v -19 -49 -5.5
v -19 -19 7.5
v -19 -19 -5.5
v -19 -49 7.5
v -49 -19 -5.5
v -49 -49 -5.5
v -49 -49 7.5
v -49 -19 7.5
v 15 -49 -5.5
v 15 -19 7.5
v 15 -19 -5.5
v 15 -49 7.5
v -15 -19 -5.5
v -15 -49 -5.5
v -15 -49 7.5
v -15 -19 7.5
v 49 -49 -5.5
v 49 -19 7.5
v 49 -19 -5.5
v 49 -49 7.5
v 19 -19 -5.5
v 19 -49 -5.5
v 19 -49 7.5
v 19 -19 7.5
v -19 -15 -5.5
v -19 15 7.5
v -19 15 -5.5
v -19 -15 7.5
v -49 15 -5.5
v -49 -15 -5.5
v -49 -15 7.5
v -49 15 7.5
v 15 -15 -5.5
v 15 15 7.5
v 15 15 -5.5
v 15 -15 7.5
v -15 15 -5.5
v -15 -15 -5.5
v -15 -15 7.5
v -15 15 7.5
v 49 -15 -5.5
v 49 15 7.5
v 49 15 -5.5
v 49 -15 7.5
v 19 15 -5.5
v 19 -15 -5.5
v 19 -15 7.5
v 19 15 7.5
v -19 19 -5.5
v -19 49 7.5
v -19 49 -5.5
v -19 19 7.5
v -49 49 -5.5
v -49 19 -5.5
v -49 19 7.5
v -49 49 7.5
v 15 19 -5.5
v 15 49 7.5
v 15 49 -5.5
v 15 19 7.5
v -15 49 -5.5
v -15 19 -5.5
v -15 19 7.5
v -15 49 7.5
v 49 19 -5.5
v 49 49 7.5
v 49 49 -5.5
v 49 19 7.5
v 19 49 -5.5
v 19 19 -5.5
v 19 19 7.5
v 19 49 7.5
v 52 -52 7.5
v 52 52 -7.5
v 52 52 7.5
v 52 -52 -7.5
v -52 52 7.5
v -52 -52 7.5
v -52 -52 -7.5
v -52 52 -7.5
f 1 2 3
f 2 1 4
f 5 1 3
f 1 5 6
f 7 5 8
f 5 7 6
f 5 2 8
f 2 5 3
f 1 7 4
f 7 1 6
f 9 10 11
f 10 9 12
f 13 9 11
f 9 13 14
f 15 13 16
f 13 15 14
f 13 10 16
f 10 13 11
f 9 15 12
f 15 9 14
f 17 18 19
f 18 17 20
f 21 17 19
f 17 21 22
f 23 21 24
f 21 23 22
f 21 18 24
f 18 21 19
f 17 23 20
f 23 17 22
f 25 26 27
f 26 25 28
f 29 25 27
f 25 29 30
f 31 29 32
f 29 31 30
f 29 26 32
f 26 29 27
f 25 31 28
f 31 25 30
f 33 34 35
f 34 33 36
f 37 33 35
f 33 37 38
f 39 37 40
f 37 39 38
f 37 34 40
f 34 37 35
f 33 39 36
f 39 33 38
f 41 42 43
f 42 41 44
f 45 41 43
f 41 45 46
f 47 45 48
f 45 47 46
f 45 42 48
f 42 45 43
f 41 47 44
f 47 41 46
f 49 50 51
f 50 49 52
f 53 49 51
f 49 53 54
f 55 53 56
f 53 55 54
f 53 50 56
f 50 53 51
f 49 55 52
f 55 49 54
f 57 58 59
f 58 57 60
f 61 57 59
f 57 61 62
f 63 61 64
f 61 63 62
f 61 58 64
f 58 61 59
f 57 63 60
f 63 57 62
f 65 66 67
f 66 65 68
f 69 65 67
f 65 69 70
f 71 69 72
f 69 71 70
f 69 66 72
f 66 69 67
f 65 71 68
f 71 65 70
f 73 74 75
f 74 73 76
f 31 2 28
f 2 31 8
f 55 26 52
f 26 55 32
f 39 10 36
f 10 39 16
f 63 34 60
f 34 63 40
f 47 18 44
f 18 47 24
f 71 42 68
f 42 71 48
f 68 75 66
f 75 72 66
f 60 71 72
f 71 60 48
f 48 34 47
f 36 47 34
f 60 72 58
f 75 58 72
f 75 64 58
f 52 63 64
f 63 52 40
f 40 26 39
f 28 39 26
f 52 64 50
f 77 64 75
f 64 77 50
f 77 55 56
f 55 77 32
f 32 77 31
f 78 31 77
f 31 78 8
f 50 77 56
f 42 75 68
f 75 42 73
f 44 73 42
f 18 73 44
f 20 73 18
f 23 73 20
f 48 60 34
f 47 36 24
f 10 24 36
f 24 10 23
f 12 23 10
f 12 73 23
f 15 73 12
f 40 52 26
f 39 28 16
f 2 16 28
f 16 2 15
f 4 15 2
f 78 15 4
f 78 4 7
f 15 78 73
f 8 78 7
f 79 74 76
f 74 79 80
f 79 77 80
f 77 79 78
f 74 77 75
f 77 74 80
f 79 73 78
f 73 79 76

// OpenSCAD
$fn = 32;

// ----------------------------------------------------------------------
// Pocket plate 104 x 104 x 15
// 3 x 3 pockets 30 mm square, 13 mm deep
// ----------------------------------------------------------------------

// --- parameters (mm) ---
thickness = 15;  // plate thickness
floor_t = 2;     // material left under each pocket
pocket = 30;     // pocket side length
pitch_x = 34;    // pocket pitch along X
pitch_y = 34;    // pocket pitch along Y
cols = 3;        // pockets per row
rows = 3;        // rows of pockets

// --- derived feature positions (mm) ---
depth = thickness - floor_t;        // = 13   pocket depth, down to the floor
span_x = (cols - 1) * pitch_x;      // = 68   distance between outer pockets
span_y = (rows - 1) * pitch_y;      // = 68   distance between outer pocket rows
origin_x = -span_x / 2;             // = -34   X of the first pocket
origin_y = -span_y / 2;             // = -34   Y of the first pocket
plate = [span_x + pocket + 6, span_y + pocket + 6, thickness];  // = [104, 104, 15]   overall size: pockets plus 3 mm of wall on each side
feature_centers = [
  [origin_x + 0 * pitch_x, origin_y + 0 * pitch_y],
  [origin_x + 1 * pitch_x, origin_y + 0 * pitch_y],
  [origin_x + 2 * pitch_x, origin_y + 0 * pitch_y],
  [origin_x + 0 * pitch_x, origin_y + 1 * pitch_y],
  [origin_x + 1 * pitch_x, origin_y + 1 * pitch_y],
  [origin_x + 2 * pitch_x, origin_y + 1 * pitch_y],
  [origin_x + 0 * pitch_x, origin_y + 2 * pitch_y],
  [origin_x + 1 * pitch_x, origin_y + 2 * pitch_y],
  [origin_x + 2 * pitch_x, origin_y + 2 * pitch_y]
];   // pocket centres, used verbatim by the cutter loop

// plate outline, then one pocket per centre in feature_centers
difference() {
  cube(plate, center = true);
  for (centre = feature_centers)
    translate([centre[0] - pocket / 2, centre[1] - pocket / 2, plate[2] / 2 - depth])
      cube([pocket, pocket, depth + 1]);  // centred on the declared pocket centre
}
